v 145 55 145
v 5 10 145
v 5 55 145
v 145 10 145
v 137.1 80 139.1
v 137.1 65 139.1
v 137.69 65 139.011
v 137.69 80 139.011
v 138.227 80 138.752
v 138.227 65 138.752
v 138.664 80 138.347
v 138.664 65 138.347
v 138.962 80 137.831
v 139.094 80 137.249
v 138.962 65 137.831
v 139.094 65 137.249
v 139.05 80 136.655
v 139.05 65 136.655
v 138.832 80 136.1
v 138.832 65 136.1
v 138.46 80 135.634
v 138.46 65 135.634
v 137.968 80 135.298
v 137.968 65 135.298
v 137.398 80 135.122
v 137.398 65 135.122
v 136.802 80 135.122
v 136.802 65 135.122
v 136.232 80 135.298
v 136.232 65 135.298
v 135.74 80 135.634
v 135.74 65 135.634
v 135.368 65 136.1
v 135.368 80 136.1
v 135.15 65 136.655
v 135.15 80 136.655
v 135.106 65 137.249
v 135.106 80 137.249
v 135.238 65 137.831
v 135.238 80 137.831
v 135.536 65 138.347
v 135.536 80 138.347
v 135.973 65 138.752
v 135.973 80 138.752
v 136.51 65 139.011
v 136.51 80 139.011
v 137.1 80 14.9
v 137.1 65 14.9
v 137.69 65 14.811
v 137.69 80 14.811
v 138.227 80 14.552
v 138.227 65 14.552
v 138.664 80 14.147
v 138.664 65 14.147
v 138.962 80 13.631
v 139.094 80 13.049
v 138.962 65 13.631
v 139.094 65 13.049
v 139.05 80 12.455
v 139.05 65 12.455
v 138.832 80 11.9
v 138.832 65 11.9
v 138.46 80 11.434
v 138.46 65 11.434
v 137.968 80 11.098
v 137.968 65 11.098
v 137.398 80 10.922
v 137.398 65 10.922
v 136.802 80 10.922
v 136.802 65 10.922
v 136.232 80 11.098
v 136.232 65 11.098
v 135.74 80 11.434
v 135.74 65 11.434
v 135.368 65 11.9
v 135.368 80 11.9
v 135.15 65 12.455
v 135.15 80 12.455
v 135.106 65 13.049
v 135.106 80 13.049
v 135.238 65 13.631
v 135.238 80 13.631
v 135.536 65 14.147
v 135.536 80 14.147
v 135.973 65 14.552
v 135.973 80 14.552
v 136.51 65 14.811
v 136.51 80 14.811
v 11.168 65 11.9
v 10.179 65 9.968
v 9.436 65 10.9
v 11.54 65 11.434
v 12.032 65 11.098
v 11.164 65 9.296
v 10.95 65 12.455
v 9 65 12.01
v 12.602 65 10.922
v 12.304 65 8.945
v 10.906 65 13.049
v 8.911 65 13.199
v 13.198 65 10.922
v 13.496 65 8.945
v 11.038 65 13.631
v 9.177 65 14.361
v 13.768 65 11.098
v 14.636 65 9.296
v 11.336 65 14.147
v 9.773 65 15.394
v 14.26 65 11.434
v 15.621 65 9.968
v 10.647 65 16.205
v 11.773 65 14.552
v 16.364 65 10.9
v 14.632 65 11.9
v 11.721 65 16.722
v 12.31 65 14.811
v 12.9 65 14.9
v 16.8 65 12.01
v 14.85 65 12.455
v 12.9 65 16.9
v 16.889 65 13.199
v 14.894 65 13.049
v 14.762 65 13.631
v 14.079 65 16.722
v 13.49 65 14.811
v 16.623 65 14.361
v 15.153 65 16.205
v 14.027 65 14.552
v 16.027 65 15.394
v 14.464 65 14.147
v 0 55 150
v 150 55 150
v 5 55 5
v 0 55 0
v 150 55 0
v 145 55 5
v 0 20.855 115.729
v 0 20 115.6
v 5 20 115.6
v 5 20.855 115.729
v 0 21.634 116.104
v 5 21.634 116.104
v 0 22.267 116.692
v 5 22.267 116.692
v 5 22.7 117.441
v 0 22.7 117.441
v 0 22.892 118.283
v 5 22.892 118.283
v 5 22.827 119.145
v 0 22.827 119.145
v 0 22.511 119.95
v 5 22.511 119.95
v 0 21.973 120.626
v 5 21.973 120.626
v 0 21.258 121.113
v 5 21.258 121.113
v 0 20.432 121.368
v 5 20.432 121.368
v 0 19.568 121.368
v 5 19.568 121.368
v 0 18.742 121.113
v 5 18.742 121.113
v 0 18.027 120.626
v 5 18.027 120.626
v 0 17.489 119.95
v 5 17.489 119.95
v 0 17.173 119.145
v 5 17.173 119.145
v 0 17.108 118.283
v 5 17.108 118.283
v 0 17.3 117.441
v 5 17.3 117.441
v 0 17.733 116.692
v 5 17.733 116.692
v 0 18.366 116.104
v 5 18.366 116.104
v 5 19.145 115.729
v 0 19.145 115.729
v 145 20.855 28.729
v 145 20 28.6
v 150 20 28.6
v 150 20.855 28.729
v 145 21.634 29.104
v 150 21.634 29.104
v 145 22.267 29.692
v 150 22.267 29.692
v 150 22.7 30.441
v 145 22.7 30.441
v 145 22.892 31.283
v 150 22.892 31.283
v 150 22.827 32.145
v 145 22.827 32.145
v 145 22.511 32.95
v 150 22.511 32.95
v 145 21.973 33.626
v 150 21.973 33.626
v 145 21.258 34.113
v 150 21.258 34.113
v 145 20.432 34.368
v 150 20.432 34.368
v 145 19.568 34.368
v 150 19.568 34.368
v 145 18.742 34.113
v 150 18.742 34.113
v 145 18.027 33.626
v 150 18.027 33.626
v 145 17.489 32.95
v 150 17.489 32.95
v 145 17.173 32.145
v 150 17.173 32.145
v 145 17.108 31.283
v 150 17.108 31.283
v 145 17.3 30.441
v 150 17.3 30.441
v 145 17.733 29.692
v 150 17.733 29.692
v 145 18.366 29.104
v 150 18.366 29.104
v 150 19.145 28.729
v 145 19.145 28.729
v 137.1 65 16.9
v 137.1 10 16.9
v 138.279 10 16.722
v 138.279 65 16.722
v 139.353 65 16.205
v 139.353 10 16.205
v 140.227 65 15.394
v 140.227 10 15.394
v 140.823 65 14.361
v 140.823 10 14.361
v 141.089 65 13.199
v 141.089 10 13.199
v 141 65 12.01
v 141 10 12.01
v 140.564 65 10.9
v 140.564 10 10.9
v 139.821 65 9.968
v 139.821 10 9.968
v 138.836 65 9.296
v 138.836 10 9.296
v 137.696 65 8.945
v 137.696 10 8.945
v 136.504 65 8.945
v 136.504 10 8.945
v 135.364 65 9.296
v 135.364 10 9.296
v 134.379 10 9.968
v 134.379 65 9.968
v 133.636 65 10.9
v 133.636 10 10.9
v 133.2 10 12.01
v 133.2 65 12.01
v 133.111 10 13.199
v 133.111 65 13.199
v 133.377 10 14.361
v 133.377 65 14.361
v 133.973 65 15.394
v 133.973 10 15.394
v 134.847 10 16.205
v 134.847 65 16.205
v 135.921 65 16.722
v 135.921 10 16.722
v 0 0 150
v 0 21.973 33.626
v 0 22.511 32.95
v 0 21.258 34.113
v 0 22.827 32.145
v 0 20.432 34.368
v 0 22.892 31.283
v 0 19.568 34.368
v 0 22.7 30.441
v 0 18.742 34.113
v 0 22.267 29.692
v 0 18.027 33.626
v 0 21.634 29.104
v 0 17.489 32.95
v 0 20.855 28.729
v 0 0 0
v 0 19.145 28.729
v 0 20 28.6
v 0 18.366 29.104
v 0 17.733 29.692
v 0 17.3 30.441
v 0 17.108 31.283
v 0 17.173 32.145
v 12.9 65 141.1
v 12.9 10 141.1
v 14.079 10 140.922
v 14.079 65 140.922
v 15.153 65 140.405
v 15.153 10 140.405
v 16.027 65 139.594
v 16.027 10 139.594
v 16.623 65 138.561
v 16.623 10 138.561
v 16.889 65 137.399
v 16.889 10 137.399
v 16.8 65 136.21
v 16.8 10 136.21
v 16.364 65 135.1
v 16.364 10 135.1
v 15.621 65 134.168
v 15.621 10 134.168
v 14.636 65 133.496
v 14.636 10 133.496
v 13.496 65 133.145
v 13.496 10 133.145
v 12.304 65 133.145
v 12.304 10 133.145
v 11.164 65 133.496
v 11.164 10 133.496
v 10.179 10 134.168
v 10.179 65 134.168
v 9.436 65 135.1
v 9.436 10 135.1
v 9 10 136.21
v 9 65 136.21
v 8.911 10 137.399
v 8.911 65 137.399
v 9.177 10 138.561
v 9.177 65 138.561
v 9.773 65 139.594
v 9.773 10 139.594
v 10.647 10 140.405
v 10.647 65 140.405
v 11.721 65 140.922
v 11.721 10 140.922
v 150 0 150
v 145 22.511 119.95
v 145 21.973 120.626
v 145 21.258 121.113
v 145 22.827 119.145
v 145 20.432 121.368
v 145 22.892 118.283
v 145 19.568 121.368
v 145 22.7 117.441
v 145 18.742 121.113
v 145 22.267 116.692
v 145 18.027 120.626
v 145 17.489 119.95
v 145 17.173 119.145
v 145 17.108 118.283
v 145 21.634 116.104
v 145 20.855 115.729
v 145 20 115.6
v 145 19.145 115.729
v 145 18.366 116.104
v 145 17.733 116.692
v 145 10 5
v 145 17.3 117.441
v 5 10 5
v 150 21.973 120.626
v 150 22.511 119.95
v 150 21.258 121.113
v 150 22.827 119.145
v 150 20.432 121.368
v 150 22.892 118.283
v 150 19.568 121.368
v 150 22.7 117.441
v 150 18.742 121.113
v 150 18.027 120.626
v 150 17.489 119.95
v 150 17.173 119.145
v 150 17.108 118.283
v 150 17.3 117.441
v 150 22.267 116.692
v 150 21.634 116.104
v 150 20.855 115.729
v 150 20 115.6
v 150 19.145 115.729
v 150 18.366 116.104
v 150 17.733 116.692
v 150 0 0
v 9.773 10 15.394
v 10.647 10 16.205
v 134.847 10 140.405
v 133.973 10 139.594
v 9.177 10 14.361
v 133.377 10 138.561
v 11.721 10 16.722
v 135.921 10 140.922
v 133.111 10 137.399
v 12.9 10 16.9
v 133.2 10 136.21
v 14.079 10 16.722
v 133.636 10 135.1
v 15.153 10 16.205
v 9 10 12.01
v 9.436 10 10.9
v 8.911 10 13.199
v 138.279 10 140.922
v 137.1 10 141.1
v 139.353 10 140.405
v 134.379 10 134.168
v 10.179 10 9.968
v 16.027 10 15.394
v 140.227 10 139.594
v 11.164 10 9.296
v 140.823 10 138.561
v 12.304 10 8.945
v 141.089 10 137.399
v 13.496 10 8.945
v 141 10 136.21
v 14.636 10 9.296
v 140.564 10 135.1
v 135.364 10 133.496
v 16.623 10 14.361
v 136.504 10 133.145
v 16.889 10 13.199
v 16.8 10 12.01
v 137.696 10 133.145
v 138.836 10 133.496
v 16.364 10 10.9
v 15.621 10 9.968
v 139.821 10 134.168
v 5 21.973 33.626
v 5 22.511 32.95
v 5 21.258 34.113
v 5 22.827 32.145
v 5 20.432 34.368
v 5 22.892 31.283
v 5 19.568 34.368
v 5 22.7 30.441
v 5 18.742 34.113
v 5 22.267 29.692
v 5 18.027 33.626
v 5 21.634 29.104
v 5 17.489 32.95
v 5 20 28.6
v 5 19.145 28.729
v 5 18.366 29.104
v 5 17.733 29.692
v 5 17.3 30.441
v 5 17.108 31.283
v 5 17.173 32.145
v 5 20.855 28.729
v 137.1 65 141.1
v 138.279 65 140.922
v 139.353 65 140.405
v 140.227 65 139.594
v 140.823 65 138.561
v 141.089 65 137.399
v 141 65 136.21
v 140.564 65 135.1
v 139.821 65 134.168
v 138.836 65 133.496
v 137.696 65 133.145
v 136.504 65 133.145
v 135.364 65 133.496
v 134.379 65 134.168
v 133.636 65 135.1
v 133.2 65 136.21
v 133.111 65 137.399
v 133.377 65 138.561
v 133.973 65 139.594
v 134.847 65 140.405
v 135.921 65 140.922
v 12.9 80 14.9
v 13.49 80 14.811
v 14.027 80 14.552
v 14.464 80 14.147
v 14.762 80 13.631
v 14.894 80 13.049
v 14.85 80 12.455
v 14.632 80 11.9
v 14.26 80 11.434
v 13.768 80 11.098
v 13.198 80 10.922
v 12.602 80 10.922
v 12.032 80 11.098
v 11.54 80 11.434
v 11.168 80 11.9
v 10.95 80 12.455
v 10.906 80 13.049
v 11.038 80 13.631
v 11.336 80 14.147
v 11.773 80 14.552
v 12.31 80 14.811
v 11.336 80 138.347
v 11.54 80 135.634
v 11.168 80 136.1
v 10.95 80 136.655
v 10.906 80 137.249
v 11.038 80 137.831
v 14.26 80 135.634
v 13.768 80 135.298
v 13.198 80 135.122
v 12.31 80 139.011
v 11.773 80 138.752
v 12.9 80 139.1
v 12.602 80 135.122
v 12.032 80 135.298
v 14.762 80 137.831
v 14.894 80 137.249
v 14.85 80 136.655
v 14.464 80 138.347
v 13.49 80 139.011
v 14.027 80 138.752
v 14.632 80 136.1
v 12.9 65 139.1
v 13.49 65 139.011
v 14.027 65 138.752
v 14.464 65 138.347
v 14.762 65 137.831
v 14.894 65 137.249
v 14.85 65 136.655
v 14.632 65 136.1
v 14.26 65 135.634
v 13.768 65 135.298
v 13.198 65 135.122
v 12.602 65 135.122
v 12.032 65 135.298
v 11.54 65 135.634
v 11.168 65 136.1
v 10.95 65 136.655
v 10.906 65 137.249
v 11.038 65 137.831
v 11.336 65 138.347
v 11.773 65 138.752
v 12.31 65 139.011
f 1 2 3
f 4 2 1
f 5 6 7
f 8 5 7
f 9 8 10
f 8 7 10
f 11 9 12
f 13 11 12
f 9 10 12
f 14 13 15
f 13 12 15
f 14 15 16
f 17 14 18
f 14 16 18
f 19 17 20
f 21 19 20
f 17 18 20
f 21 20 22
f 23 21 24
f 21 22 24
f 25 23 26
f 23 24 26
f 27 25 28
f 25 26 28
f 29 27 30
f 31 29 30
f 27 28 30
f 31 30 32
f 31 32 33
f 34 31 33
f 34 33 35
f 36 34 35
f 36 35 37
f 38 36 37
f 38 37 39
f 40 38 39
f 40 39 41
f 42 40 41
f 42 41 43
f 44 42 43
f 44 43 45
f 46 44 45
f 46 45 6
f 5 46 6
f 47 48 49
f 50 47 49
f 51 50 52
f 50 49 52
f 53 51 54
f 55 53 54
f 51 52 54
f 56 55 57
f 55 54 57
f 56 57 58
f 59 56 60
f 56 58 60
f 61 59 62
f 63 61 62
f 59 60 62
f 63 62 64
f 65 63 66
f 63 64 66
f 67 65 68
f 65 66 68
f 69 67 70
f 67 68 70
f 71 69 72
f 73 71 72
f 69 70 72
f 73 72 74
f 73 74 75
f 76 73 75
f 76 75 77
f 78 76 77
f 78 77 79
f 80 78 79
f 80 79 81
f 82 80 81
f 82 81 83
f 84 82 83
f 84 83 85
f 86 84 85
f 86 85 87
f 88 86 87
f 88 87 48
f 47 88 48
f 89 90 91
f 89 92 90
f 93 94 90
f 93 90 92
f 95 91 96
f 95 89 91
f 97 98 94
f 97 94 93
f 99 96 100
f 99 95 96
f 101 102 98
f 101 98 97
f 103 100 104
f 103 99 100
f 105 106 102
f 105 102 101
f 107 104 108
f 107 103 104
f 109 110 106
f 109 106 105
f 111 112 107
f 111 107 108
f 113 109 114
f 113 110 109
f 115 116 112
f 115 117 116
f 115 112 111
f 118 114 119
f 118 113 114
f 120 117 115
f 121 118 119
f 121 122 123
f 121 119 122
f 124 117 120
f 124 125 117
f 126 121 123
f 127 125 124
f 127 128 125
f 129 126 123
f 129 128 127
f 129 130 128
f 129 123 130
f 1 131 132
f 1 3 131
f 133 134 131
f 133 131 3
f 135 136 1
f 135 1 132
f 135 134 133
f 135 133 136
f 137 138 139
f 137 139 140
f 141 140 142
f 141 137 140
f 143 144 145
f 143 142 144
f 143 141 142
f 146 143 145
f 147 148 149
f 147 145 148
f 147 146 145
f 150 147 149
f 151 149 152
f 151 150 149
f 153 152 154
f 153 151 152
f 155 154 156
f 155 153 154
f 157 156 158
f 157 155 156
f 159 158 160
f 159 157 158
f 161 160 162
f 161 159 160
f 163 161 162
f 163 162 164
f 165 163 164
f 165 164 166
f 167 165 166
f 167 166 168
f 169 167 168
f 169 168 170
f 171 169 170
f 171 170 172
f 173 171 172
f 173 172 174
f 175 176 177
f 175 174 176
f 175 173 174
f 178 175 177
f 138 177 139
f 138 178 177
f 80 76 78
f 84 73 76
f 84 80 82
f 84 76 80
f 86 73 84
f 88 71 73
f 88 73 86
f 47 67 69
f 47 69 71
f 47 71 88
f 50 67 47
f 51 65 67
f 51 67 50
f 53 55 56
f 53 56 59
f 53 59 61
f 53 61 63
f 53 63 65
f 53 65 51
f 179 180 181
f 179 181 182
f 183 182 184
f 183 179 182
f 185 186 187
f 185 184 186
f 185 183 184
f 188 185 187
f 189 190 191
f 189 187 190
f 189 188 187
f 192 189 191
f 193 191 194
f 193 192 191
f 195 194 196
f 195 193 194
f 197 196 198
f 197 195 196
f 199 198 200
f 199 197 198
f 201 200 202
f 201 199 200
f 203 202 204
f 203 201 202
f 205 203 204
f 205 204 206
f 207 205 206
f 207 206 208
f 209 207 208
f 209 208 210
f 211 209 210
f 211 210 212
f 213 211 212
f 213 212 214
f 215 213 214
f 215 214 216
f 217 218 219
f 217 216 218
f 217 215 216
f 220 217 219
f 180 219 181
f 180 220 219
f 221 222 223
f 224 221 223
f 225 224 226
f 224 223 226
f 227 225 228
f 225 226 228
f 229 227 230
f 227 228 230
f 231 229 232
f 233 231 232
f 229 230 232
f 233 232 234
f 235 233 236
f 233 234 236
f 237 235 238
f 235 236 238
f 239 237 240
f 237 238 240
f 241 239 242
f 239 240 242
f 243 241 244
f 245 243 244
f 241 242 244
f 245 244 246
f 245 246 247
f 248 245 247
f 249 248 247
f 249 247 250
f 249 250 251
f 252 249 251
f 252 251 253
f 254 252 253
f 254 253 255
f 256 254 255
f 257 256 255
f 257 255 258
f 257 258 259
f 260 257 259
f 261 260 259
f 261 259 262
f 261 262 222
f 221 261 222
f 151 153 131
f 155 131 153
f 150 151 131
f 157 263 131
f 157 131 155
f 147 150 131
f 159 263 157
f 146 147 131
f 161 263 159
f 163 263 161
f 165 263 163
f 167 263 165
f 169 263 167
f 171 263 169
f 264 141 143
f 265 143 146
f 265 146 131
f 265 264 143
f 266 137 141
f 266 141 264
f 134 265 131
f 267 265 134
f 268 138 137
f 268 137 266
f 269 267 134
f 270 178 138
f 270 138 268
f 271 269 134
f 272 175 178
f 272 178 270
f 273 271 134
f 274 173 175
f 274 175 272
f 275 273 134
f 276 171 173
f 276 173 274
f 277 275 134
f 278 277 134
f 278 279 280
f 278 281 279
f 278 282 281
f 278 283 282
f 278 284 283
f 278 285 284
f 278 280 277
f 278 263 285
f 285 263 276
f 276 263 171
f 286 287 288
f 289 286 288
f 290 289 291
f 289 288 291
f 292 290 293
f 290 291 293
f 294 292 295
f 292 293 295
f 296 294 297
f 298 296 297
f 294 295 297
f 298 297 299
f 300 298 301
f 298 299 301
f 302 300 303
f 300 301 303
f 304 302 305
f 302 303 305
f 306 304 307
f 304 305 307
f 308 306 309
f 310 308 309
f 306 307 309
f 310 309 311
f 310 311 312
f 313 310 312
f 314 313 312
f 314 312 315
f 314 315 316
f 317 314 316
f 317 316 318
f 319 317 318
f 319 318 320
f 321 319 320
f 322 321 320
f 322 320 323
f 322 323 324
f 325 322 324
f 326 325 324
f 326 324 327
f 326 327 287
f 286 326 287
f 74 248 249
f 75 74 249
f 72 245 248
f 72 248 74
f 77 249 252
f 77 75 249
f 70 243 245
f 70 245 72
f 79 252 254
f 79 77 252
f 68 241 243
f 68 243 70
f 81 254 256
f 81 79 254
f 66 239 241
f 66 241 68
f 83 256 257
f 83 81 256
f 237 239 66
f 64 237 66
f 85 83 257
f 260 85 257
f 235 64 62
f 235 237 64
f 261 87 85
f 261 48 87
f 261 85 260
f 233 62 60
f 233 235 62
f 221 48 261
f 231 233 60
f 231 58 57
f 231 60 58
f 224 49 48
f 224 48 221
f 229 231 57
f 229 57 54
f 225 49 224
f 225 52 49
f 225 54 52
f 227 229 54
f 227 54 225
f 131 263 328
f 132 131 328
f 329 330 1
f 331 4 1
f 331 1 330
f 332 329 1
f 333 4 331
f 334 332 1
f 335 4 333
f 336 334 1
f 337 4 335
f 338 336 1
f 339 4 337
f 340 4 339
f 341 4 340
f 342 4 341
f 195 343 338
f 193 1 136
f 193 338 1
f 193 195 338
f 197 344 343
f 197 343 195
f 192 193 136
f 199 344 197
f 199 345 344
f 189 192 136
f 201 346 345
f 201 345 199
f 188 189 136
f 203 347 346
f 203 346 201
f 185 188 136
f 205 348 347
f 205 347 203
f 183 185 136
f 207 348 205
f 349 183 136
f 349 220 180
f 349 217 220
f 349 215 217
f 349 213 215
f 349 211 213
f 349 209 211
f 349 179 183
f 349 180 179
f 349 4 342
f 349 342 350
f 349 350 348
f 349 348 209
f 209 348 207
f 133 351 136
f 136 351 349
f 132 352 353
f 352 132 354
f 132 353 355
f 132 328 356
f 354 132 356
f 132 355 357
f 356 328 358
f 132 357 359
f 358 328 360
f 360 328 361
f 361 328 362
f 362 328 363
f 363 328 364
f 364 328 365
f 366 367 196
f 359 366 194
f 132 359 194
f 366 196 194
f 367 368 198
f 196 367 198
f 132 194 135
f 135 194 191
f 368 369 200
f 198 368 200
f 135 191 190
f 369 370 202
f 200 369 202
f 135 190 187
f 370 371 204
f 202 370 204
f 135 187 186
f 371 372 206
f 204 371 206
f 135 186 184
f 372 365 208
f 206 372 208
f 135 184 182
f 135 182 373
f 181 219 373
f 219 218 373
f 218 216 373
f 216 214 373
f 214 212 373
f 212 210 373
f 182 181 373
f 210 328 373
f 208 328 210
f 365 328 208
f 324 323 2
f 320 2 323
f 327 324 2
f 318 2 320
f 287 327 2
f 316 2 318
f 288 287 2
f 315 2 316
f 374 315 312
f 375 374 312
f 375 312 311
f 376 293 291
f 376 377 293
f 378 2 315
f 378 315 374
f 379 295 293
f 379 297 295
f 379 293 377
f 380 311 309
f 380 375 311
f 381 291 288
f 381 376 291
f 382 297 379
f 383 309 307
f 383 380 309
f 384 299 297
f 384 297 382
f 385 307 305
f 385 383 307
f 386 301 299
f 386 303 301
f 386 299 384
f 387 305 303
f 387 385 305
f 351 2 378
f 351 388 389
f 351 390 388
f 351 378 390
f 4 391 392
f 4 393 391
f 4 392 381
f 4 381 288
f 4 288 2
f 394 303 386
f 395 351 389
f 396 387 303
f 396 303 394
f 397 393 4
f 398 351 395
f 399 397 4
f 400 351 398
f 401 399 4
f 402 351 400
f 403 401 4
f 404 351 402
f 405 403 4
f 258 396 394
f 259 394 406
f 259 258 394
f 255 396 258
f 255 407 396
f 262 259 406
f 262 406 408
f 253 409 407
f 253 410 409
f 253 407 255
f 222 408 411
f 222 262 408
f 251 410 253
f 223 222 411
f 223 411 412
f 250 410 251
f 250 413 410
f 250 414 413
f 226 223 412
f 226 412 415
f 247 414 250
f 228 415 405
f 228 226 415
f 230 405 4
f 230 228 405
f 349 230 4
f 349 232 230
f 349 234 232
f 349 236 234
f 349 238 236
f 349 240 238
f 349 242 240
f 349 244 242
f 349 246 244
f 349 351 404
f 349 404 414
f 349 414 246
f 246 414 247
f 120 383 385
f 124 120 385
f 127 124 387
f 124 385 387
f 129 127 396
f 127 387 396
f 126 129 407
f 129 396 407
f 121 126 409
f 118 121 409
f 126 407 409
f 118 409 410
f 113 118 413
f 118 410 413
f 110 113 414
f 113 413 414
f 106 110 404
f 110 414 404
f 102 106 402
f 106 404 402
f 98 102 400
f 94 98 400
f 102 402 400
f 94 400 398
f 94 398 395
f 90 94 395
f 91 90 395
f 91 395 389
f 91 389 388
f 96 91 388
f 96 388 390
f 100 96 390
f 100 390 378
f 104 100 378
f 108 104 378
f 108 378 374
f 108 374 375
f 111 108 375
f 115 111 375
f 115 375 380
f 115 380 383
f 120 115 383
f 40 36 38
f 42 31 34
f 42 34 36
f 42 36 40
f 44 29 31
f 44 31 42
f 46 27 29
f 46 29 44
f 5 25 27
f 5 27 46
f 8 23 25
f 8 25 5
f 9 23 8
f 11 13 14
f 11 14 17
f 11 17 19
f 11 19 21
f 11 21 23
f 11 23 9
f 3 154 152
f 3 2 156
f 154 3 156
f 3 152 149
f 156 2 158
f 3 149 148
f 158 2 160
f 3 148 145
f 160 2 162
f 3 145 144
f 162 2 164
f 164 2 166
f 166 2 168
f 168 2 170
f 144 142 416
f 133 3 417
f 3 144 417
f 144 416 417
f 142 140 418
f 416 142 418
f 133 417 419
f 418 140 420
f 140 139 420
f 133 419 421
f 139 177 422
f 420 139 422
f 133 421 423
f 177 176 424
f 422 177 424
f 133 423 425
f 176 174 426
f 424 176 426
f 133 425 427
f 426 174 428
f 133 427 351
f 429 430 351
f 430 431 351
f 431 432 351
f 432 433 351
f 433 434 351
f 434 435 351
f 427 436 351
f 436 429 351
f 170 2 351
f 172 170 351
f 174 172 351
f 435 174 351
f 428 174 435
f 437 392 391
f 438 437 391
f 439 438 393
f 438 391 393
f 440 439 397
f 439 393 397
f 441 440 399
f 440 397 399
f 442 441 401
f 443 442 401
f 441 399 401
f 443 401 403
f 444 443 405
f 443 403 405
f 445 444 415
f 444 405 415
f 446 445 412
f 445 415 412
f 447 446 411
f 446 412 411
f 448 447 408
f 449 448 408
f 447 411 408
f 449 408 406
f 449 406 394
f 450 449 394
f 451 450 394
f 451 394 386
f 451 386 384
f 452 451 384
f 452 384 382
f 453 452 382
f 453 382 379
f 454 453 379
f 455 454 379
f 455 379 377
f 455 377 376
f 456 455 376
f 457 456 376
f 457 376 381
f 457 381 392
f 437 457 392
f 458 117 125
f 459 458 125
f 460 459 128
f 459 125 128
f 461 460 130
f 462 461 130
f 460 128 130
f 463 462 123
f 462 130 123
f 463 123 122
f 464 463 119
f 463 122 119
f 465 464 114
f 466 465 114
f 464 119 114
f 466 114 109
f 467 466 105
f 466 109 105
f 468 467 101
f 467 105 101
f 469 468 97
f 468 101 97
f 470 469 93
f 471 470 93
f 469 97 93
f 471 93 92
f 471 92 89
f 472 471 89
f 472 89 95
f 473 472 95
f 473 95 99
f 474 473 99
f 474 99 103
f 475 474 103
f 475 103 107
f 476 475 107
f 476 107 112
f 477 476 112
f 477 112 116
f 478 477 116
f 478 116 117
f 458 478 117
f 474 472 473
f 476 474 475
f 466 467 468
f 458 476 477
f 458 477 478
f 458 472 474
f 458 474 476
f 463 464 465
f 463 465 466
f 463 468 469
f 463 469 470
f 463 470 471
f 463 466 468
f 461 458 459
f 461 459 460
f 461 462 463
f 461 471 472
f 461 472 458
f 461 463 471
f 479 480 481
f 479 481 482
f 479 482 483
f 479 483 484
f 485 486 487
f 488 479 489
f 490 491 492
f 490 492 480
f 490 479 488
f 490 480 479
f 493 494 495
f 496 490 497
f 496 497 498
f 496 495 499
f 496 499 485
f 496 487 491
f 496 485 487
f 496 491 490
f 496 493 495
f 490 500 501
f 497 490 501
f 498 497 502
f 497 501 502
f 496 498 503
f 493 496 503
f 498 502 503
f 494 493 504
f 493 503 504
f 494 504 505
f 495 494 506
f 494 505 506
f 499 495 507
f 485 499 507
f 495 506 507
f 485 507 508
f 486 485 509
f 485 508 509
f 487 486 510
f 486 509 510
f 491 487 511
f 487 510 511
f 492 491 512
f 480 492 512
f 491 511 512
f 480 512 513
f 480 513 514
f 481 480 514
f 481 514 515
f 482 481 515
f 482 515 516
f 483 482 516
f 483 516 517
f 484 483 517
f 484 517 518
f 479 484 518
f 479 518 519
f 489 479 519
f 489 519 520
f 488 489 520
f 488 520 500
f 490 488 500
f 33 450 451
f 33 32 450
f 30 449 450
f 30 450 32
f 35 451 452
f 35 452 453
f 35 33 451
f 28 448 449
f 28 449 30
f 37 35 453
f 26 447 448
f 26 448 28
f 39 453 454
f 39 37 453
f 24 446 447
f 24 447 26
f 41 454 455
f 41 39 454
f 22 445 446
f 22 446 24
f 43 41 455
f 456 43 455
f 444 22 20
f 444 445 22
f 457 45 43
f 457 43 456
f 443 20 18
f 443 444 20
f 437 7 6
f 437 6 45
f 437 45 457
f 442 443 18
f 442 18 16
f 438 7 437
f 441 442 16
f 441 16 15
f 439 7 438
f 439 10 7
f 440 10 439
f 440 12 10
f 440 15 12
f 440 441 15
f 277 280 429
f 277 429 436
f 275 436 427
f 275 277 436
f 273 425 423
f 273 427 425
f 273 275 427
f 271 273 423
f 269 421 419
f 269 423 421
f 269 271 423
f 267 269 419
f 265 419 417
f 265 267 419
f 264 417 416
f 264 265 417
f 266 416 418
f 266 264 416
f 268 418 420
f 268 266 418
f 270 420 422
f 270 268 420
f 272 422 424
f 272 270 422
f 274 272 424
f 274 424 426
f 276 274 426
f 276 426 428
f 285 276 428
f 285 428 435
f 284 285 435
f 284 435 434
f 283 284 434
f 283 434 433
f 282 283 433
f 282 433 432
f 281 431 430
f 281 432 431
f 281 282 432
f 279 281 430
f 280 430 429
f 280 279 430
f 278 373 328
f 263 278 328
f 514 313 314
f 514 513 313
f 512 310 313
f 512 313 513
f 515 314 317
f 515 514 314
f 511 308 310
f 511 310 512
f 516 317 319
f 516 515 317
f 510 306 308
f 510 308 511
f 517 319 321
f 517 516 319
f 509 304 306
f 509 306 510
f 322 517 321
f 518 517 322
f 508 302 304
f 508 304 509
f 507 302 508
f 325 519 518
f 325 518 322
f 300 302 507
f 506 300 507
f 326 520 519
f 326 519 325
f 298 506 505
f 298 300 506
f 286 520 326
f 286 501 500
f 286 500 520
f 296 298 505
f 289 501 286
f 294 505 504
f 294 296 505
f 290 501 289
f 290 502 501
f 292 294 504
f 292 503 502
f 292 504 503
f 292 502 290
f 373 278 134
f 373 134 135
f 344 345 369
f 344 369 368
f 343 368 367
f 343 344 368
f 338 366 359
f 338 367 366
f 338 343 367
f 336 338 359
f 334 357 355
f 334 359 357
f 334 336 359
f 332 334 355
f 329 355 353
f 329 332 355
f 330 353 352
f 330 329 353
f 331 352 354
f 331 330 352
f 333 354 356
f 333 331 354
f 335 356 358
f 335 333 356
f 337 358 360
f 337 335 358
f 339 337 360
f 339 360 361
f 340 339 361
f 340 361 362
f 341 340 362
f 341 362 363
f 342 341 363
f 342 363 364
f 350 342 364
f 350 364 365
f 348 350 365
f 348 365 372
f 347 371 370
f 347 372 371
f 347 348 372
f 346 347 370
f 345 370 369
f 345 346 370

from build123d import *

# Parameters (mm, degrees)
SKETCH1_W               = 150
SKETCH1_H               = 150
SKETCH1_W_2             = 140
SKETCH1_H_2             = 140
BOSS_EXTRUDE1_DEPTH     = 55
SKETCH1_3_W             = 140
SKETCH1_3_H             = 140
SKETCH1_3_R             = 4
BOSS_EXTRUDE2_DEPTH     = 10
SKETCH1_4_R             = 4
SKETCH1_4_R_2           = 2
BOSS_EXTRUDE3_DEPTH     = 65
SKETCH1_5_R             = 2
BOSS_EXTRUDE4_DEPTH     = 80
CUT_EXTRUDE3_DEPTH      = 227.715680975
CUT_EXTRUDE3_DEPTH_BACK = 130
SKETCH3_R               = 2.9


with BuildPart() as part:
    # Sketch1 → Boss-Extrude1 (new body)
    with BuildSketch(Plane(origin=(0, 0, 0), x_dir=(1, 0, 0), z_dir=(0, 1, 0))):
        with Locations((75, -75)):
            Rectangle(SKETCH1_W, SKETCH1_H)
        with Locations((75, -75)):
            Rectangle(SKETCH1_W_2, SKETCH1_H_2, mode=Mode.SUBTRACT)
    extrude(amount=BOSS_EXTRUDE1_DEPTH)

    # Sketch1<3> → Boss-Extrude2 (add)
    with BuildSketch(Plane(origin=(0, 0, 0), x_dir=(1, 0, 0), z_dir=(0, 1, 0))):
        with Locations((75, -75)):
            Rectangle(SKETCH1_3_W, SKETCH1_3_H)
        with Locations((12.9, -137.1)):
            Circle(SKETCH1_3_R, mode=Mode.SUBTRACT)
        with Locations((137.1, -137.1)):
            Circle(SKETCH1_3_R, mode=Mode.SUBTRACT)
        with Locations((12.9, -12.9)):
            Circle(SKETCH1_3_R, mode=Mode.SUBTRACT)
        with Locations((137.1, -12.9)):
            Circle(SKETCH1_3_R, mode=Mode.SUBTRACT)
    extrude(amount=BOSS_EXTRUDE2_DEPTH)

    # Sketch1<4> → Boss-Extrude3 (add)
    # profile 1 of 4: a face of its own
    with BuildSketch(Plane(origin=(0, 0, 0), x_dir=(1, 0, 0), z_dir=(0, 1, 0))):
        with Locations((12.9, -12.9)):
            Circle(SKETCH1_4_R)
        with Locations((12.9, -12.9)):
            Circle(SKETCH1_4_R_2, mode=Mode.SUBTRACT)
    # profile 2 of 4: a face of its own
    with BuildSketch(Plane(origin=(0, 0, 0), x_dir=(1, 0, 0), z_dir=(0, 1, 0))):
        with Locations((137.1, -12.9)):
            Circle(SKETCH1_4_R)
        with Locations((137.1, -12.9)):
            Circle(SKETCH1_4_R_2, mode=Mode.SUBTRACT)
    # profile 3 of 4: a face of its own
    with BuildSketch(Plane(origin=(0, 0, 0), x_dir=(1, 0, 0), z_dir=(0, 1, 0))):
        with Locations((137.1, -137.1)):
            Circle(SKETCH1_4_R)
        with Locations((137.1, -137.1)):
            Circle(SKETCH1_4_R_2, mode=Mode.SUBTRACT)
    # profile 4 of 4: a face of its own
    with BuildSketch(Plane(origin=(0, 0, 0), x_dir=(1, 0, 0), z_dir=(0, 1, 0))):
        with Locations((12.9, -137.1)):
            Circle(SKETCH1_4_R)
        with Locations((12.9, -137.1)):
            Circle(SKETCH1_4_R_2, mode=Mode.SUBTRACT)
    extrude(amount=BOSS_EXTRUDE3_DEPTH)

    # Sketch1<5> → Boss-Extrude4 (add)
    with BuildSketch(Plane(origin=(0, 0, 0), x_dir=(1, 0, 0), z_dir=(0, 1, 0))):
        with Locations((12.9, -12.9)):
            Circle(SKETCH1_5_R)
        with Locations((137.1, -12.9)):
            Circle(SKETCH1_5_R)
        with Locations((137.1, -137.1)):
            Circle(SKETCH1_5_R)
        with Locations((12.9, -137.1)):
            Circle(SKETCH1_5_R)
    extrude(amount=BOSS_EXTRUDE4_DEPTH)

    # Sketch3 → Cut-Extrude3 (cut, two sides: drawn at the far end of the back side and taken through both)
    with BuildSketch(Plane(origin=(0, 0, 0), x_dir=(0, 0, -1), z_dir=(1, 0, 0)).offset(-CUT_EXTRUDE3_DEPTH_BACK)):
        with Locations((-31.5, 20)):
            Circle(SKETCH3_R)
        with Locations((-118.5, 20)):
            Circle(SKETCH3_R)
    extrude(amount=CUT_EXTRUDE3_DEPTH + CUT_EXTRUDE3_DEPTH_BACK, mode=Mode.SUBTRACT)


solid = part.part
